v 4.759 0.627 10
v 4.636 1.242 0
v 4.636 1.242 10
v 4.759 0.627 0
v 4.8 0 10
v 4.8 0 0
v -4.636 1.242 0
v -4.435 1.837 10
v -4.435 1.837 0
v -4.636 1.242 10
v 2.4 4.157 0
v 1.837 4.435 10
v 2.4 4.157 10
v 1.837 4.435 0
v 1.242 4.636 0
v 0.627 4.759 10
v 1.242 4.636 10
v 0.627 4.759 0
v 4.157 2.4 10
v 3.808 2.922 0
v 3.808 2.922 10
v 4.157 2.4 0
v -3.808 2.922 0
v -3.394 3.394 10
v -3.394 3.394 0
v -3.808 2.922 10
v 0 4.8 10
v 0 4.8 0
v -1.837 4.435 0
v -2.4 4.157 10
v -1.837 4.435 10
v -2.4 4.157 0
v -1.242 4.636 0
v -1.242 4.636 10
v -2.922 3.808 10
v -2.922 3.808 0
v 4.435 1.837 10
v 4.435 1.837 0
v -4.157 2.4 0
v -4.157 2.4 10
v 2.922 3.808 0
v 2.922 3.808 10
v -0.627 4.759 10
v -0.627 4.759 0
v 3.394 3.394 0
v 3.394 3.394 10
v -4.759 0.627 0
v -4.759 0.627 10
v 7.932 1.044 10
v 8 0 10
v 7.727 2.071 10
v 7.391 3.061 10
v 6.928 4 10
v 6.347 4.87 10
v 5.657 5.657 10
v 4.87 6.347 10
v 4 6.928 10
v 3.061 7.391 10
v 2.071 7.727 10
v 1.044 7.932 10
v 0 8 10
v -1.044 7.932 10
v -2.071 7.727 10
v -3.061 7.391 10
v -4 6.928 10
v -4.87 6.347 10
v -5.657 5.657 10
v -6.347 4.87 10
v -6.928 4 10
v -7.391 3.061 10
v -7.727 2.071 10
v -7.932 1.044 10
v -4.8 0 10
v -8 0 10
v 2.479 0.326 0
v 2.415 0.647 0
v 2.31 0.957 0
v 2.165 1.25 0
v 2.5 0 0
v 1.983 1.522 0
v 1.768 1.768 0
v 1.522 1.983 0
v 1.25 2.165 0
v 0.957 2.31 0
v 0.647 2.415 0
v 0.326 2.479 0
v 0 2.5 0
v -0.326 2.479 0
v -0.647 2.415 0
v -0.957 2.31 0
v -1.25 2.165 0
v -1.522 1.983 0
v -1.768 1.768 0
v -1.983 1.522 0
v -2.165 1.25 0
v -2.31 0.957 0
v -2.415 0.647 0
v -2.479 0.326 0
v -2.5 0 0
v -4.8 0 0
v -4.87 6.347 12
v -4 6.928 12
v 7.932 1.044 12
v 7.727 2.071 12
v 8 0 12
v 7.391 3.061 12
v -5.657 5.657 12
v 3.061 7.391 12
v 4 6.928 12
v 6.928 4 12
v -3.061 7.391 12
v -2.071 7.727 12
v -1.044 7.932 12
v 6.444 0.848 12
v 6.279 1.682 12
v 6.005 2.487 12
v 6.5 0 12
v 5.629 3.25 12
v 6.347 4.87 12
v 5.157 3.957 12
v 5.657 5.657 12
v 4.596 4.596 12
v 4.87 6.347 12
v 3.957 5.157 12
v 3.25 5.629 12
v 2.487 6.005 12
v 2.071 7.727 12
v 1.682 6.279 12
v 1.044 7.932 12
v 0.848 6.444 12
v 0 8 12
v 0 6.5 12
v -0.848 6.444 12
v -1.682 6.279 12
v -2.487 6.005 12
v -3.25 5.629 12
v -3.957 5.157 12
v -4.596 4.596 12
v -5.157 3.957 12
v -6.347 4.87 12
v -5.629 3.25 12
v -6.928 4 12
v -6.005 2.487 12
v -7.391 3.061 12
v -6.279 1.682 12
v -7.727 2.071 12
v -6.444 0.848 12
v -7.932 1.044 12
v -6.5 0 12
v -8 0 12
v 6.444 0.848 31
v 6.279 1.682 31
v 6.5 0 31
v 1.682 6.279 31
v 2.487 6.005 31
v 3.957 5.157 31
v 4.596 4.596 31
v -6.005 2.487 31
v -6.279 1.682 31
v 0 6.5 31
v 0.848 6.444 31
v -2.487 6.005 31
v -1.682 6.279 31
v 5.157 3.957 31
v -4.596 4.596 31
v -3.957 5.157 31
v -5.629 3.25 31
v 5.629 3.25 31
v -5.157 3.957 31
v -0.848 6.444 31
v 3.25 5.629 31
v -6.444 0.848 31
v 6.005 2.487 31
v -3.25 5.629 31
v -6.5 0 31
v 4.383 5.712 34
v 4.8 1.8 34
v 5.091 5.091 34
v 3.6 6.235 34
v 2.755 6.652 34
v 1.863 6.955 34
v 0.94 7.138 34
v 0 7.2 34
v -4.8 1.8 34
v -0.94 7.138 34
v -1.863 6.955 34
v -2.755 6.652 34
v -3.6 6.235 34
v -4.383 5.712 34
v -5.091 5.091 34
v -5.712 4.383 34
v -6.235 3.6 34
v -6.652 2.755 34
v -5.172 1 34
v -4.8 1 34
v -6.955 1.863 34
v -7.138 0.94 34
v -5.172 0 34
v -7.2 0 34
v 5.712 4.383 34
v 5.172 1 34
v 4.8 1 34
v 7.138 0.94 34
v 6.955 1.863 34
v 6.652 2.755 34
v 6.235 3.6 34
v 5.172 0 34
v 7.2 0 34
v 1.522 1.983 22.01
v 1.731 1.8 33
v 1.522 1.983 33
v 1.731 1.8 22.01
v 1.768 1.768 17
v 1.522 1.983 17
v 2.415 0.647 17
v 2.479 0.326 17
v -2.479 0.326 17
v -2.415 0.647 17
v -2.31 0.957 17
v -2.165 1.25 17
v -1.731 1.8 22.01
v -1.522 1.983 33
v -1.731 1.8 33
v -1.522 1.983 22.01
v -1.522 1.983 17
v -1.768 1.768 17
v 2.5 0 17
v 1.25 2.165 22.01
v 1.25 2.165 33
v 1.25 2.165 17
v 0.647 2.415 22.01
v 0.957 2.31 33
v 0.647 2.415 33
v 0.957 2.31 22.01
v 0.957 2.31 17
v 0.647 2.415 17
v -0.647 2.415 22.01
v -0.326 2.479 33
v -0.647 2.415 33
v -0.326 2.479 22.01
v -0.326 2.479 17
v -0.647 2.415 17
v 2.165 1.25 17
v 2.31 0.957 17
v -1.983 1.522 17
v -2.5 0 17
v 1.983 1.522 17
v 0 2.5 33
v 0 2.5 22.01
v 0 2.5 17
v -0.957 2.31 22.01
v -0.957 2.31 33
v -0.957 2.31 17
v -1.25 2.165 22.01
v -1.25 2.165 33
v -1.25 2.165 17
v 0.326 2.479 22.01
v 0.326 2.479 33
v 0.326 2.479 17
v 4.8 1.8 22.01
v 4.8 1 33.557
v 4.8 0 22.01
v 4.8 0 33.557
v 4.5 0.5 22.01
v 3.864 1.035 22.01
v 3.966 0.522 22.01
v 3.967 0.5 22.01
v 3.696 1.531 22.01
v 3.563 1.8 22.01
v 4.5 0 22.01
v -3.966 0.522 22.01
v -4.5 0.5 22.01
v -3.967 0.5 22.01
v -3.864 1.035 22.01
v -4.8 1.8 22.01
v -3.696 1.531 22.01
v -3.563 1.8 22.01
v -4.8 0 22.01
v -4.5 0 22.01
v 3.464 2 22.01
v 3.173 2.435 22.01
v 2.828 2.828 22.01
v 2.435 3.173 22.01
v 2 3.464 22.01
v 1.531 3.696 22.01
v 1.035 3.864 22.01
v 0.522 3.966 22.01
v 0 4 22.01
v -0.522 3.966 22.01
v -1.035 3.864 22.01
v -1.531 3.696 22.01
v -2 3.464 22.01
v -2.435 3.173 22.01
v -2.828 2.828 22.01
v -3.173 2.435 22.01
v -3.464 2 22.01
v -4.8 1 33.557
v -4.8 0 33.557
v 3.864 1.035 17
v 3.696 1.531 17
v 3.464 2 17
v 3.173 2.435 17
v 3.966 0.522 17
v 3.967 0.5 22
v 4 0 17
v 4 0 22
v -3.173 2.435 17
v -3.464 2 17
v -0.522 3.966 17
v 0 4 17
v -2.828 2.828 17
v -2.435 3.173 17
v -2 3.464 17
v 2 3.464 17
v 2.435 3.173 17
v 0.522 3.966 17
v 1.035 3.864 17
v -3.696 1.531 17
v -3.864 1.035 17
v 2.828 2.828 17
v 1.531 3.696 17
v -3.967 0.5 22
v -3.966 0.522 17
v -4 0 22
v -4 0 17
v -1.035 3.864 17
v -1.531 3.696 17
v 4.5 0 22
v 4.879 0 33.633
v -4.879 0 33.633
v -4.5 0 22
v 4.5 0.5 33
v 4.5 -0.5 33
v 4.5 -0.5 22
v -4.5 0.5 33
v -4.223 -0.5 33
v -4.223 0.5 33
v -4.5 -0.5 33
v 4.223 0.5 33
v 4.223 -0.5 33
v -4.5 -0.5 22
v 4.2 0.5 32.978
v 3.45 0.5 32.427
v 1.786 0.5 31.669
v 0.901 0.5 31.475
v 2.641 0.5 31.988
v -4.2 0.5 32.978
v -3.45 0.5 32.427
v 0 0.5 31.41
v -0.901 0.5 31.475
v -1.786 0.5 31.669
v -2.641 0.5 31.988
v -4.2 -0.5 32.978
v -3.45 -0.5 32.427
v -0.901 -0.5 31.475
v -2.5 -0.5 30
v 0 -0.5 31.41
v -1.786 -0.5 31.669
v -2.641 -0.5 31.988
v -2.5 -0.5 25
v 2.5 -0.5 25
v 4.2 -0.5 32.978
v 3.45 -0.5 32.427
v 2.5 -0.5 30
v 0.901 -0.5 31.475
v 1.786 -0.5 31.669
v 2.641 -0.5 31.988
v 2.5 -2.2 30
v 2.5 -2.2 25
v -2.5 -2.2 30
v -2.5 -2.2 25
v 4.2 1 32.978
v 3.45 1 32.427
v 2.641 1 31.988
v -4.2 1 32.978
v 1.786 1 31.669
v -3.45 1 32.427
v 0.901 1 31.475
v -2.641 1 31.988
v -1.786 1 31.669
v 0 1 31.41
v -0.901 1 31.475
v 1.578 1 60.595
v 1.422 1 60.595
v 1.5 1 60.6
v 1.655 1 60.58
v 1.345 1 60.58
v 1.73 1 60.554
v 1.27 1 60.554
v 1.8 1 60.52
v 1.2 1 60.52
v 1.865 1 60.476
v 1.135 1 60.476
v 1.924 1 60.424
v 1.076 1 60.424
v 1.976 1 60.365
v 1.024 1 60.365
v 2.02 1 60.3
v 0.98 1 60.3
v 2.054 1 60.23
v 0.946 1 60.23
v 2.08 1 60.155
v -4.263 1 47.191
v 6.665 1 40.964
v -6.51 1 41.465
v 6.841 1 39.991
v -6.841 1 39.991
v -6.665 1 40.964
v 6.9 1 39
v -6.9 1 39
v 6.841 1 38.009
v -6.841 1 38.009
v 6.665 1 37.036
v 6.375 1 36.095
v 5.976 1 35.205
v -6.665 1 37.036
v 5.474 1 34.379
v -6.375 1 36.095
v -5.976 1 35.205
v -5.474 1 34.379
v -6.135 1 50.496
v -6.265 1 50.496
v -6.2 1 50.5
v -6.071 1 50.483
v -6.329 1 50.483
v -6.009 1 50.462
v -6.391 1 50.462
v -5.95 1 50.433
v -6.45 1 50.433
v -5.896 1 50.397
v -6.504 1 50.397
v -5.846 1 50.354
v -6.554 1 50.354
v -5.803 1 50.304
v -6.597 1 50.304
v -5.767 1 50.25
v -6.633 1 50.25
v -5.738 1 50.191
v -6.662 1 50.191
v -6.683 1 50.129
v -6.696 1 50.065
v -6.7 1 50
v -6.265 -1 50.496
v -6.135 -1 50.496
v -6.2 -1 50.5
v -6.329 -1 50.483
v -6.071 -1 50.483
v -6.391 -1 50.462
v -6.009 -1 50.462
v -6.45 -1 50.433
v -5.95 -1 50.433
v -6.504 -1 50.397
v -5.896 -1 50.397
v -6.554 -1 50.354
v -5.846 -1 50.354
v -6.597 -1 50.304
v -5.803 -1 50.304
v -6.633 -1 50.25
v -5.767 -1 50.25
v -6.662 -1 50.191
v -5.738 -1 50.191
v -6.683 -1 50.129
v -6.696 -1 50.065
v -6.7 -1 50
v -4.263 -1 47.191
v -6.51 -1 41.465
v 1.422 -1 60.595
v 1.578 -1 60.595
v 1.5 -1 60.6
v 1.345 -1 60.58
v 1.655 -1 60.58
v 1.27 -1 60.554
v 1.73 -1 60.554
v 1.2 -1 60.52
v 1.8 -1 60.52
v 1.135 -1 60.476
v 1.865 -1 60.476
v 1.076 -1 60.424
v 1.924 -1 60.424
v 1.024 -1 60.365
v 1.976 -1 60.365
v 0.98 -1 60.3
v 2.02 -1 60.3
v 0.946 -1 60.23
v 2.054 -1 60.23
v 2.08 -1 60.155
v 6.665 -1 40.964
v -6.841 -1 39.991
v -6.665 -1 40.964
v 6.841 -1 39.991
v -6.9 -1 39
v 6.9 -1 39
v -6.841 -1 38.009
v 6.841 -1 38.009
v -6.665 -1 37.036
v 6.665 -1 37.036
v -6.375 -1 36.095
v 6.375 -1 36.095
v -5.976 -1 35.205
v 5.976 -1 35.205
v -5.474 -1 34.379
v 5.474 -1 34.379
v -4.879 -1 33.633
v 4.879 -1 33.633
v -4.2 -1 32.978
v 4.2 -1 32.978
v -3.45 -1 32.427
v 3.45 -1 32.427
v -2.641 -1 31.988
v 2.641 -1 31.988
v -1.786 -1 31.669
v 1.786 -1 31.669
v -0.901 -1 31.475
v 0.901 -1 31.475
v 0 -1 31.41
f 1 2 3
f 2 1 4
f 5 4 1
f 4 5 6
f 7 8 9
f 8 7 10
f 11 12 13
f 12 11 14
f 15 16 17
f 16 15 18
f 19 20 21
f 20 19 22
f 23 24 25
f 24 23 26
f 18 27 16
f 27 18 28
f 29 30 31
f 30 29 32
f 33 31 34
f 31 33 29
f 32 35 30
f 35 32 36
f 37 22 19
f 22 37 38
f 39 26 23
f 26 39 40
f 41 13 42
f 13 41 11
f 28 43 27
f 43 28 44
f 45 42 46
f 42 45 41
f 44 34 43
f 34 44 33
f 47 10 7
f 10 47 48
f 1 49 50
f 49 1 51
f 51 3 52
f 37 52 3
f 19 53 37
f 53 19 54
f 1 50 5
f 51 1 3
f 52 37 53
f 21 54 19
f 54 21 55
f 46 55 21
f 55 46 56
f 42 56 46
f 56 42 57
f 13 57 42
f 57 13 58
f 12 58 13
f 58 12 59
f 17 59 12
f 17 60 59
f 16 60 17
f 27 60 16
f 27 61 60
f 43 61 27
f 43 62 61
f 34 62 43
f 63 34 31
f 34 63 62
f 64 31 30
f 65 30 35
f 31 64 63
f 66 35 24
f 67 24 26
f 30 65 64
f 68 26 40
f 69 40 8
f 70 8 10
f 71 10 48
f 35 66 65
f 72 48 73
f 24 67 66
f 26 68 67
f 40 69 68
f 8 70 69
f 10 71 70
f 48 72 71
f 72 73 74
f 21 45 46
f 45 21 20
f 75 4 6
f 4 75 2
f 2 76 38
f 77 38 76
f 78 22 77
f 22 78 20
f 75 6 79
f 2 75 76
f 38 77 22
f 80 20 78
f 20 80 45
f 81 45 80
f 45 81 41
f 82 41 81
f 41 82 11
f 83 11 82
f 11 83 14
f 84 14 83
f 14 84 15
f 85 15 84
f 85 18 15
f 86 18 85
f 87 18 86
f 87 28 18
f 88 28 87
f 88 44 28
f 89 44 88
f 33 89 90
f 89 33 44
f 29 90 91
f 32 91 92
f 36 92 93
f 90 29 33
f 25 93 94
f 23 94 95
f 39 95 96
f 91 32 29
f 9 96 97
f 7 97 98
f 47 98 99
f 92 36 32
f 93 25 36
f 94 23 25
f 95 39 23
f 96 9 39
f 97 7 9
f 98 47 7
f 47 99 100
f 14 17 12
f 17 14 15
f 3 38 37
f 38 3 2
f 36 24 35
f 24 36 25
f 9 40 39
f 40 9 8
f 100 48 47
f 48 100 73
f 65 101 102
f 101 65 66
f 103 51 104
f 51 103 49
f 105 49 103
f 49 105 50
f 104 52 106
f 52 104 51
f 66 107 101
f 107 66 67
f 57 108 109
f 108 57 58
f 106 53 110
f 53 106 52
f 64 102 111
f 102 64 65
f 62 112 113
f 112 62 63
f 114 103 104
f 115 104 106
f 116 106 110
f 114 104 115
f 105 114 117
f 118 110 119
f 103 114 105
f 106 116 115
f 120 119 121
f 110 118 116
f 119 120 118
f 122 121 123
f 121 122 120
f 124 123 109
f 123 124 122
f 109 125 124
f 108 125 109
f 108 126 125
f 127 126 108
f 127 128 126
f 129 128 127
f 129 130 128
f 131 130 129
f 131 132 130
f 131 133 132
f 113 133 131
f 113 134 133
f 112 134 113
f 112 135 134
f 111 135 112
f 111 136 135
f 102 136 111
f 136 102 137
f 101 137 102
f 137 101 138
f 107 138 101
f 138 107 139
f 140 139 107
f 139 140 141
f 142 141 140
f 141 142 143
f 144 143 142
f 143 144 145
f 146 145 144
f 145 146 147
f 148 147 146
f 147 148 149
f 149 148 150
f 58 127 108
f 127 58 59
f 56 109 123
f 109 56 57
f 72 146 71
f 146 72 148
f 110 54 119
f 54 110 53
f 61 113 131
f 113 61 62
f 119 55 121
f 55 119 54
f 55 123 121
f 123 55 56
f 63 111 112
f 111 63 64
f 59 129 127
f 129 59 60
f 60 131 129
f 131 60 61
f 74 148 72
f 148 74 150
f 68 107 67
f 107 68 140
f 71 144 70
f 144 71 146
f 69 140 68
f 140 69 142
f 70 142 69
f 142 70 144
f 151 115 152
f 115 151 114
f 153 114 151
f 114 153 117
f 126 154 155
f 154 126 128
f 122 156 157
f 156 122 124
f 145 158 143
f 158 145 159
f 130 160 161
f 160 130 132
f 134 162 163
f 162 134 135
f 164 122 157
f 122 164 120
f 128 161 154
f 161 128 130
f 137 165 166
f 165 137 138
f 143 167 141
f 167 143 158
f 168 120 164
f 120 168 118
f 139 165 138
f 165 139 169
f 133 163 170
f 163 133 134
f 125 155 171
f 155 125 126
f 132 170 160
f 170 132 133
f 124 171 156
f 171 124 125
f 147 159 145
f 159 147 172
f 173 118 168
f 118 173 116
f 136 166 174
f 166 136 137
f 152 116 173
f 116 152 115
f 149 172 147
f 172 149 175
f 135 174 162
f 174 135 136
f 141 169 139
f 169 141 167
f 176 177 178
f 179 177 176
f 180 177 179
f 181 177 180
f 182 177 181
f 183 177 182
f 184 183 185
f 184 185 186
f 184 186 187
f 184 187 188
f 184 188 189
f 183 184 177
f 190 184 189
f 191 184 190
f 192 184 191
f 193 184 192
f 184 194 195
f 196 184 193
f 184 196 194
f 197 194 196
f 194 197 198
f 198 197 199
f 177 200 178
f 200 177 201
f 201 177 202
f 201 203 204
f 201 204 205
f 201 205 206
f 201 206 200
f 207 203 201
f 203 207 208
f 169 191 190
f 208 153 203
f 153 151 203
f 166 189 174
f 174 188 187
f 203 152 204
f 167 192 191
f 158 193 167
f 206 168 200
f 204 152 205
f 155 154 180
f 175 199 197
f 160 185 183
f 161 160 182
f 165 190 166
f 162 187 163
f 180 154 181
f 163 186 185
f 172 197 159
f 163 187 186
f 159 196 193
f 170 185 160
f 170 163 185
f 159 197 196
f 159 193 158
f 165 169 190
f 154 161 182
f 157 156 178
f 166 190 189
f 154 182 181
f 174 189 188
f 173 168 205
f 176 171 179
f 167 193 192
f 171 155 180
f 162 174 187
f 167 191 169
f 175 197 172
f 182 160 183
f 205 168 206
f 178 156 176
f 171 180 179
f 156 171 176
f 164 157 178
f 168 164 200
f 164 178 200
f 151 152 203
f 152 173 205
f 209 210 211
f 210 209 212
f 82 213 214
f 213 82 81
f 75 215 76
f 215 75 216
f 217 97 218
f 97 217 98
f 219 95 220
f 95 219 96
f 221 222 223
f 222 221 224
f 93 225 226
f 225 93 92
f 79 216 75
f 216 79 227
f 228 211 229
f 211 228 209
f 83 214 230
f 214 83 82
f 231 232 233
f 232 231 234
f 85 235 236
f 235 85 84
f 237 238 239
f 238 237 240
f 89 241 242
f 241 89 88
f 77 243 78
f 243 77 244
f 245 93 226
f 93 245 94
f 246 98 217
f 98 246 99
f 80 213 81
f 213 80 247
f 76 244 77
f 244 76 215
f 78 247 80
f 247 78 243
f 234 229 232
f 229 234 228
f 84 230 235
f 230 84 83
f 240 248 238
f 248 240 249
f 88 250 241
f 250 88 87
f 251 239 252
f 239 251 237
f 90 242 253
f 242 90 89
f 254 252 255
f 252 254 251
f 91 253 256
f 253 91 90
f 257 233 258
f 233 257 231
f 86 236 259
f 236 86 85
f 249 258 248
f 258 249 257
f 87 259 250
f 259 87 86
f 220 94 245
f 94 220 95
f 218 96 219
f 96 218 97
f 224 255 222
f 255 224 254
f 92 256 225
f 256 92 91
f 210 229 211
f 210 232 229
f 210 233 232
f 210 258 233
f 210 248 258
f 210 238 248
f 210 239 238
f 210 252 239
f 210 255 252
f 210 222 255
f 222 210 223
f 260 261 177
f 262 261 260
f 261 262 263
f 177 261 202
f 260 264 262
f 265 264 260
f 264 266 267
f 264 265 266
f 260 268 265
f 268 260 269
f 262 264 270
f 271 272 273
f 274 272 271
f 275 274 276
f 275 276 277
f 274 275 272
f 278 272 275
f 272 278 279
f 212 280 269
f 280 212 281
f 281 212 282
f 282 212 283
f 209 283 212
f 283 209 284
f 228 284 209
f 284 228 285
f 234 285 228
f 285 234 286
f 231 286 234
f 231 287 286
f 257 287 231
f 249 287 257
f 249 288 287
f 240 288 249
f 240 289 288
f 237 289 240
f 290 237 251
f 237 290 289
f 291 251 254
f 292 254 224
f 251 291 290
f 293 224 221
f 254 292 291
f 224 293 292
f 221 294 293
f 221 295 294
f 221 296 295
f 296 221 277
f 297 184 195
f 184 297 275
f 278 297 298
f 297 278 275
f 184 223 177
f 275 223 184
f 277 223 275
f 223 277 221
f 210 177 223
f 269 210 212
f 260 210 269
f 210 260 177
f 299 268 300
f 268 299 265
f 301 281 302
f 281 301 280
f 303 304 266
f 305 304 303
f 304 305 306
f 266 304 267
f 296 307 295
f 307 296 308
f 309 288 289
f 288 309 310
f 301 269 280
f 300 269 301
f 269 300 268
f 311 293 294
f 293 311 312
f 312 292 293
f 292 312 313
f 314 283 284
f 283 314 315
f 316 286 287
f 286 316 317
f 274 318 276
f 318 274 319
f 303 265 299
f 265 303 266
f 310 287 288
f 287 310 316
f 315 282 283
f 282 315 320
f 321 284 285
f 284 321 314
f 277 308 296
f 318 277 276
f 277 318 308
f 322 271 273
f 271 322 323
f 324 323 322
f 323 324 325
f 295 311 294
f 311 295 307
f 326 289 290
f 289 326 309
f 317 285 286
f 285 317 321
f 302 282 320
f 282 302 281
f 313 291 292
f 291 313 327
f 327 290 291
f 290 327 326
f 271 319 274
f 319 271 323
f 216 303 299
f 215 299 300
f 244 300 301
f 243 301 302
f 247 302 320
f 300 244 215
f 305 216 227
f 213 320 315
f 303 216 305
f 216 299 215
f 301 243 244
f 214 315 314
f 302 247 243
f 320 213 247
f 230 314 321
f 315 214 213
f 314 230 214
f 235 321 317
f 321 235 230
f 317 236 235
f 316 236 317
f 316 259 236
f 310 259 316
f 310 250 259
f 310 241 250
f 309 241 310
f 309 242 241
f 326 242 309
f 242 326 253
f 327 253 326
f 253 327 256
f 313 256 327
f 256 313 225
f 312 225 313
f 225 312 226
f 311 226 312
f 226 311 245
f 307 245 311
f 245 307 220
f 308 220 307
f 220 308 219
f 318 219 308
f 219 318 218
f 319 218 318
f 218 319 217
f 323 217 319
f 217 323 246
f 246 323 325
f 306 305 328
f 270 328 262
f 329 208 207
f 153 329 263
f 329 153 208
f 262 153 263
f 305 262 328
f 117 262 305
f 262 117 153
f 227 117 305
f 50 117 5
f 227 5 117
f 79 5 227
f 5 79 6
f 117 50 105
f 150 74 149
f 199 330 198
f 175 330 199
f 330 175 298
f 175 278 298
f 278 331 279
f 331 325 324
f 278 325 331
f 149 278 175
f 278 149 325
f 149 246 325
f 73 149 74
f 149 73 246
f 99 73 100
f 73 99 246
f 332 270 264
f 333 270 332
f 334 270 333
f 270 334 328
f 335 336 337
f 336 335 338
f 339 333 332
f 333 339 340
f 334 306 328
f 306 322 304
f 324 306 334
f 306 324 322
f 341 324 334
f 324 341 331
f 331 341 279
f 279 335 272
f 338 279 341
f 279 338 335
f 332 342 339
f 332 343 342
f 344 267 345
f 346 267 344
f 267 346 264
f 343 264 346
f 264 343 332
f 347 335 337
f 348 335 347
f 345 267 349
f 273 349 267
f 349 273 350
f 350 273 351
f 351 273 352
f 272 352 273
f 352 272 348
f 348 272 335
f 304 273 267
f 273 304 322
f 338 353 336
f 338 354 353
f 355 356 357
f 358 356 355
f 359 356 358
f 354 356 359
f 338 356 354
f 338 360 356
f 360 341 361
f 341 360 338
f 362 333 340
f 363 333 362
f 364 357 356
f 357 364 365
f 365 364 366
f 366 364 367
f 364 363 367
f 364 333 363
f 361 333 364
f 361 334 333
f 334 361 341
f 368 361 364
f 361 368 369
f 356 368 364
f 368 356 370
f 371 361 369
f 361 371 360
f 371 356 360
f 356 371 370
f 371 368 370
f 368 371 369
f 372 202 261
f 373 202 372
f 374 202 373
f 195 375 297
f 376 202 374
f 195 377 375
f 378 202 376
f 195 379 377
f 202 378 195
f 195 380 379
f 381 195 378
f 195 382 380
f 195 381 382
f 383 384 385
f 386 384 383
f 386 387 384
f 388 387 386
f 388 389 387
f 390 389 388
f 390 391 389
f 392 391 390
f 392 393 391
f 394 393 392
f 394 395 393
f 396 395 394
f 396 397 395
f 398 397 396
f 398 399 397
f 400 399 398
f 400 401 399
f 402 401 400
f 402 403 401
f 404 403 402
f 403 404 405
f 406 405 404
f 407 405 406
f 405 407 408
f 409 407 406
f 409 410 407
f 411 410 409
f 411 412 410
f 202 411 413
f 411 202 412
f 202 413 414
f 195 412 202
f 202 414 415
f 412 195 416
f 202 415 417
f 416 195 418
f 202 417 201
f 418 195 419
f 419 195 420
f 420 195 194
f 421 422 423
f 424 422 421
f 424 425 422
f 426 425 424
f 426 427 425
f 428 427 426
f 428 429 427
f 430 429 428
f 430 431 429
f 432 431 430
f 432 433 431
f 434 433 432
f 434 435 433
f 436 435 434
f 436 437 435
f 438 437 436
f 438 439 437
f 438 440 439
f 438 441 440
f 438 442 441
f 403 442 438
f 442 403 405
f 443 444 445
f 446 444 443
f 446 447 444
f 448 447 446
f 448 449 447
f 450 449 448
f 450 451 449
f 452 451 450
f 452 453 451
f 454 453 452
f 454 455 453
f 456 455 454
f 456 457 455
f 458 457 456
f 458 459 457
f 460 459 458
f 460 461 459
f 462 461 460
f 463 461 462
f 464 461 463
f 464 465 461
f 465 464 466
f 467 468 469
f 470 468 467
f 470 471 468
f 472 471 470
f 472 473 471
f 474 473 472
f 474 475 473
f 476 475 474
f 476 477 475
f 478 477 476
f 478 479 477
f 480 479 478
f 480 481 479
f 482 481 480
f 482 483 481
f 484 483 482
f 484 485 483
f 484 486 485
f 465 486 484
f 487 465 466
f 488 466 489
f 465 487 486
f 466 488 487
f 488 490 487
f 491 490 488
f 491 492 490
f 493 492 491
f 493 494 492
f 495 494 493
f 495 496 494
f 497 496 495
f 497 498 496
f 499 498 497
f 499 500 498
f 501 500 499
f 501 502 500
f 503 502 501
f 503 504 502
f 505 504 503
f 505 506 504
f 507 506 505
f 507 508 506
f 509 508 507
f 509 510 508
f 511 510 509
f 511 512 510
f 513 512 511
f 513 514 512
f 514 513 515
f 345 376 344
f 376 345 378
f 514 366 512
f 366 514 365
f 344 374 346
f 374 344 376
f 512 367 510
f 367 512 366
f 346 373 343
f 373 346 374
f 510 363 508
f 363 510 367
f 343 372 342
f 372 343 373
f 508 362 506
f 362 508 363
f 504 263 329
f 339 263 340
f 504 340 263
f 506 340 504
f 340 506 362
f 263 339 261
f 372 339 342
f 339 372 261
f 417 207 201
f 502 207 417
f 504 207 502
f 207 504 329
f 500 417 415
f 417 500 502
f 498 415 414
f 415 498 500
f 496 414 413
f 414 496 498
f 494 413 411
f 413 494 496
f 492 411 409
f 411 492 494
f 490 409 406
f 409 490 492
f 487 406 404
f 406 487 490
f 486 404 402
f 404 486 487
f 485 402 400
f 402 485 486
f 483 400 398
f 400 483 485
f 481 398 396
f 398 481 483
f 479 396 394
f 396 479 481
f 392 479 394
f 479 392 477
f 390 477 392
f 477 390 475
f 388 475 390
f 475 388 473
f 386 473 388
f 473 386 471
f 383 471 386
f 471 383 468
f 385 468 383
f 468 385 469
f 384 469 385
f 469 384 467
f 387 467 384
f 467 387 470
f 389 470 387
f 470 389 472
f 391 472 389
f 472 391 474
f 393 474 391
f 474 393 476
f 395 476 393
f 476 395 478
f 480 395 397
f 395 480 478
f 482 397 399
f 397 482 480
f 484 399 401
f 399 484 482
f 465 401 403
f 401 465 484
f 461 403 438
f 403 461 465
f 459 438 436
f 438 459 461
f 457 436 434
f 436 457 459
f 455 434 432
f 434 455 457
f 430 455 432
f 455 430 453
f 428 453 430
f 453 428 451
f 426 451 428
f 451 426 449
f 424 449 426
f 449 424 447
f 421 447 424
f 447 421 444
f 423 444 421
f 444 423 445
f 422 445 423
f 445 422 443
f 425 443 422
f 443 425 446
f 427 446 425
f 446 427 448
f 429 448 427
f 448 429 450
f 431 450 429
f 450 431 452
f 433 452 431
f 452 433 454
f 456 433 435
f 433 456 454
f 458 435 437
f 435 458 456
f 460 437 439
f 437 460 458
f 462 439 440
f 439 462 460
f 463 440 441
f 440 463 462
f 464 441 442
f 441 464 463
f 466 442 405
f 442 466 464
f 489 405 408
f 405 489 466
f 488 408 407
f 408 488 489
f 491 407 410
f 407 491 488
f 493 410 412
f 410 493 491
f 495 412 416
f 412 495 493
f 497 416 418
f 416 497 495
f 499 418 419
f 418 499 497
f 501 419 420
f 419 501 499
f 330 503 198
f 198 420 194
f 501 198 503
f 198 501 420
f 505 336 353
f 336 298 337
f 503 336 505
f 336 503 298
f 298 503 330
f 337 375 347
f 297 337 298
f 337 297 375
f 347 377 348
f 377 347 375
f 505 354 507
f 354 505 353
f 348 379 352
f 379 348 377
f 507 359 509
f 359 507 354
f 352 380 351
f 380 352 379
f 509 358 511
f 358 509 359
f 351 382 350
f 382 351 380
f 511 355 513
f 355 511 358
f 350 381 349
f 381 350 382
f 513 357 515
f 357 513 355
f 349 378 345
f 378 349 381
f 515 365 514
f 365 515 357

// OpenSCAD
// Cross-section of one candle with the flame LED inside (fit check only)
include <hanukkiah.scad>
part = "none";
// candle cut in half (front half removed)
color(C_WHITE) difference() { candle(); translate([-20, -40, -1]) cube([40, 40, 60]); }
// LED: PCB tail (9 x 11 x 1) + SOIC-8 chip, seated on the slot floor
translate([0, 0, CANDLE_H - LED_PCB_H - 1]) {
    color("#c8a24a") translate([-4.5, -0.5, 0]) cube([9, 1, 11]);
    color("#222") translate([-2.5, -2.2, 3]) cube([5, 1.7, 5]);
    translate([0, 0, 11]) flame();
}
